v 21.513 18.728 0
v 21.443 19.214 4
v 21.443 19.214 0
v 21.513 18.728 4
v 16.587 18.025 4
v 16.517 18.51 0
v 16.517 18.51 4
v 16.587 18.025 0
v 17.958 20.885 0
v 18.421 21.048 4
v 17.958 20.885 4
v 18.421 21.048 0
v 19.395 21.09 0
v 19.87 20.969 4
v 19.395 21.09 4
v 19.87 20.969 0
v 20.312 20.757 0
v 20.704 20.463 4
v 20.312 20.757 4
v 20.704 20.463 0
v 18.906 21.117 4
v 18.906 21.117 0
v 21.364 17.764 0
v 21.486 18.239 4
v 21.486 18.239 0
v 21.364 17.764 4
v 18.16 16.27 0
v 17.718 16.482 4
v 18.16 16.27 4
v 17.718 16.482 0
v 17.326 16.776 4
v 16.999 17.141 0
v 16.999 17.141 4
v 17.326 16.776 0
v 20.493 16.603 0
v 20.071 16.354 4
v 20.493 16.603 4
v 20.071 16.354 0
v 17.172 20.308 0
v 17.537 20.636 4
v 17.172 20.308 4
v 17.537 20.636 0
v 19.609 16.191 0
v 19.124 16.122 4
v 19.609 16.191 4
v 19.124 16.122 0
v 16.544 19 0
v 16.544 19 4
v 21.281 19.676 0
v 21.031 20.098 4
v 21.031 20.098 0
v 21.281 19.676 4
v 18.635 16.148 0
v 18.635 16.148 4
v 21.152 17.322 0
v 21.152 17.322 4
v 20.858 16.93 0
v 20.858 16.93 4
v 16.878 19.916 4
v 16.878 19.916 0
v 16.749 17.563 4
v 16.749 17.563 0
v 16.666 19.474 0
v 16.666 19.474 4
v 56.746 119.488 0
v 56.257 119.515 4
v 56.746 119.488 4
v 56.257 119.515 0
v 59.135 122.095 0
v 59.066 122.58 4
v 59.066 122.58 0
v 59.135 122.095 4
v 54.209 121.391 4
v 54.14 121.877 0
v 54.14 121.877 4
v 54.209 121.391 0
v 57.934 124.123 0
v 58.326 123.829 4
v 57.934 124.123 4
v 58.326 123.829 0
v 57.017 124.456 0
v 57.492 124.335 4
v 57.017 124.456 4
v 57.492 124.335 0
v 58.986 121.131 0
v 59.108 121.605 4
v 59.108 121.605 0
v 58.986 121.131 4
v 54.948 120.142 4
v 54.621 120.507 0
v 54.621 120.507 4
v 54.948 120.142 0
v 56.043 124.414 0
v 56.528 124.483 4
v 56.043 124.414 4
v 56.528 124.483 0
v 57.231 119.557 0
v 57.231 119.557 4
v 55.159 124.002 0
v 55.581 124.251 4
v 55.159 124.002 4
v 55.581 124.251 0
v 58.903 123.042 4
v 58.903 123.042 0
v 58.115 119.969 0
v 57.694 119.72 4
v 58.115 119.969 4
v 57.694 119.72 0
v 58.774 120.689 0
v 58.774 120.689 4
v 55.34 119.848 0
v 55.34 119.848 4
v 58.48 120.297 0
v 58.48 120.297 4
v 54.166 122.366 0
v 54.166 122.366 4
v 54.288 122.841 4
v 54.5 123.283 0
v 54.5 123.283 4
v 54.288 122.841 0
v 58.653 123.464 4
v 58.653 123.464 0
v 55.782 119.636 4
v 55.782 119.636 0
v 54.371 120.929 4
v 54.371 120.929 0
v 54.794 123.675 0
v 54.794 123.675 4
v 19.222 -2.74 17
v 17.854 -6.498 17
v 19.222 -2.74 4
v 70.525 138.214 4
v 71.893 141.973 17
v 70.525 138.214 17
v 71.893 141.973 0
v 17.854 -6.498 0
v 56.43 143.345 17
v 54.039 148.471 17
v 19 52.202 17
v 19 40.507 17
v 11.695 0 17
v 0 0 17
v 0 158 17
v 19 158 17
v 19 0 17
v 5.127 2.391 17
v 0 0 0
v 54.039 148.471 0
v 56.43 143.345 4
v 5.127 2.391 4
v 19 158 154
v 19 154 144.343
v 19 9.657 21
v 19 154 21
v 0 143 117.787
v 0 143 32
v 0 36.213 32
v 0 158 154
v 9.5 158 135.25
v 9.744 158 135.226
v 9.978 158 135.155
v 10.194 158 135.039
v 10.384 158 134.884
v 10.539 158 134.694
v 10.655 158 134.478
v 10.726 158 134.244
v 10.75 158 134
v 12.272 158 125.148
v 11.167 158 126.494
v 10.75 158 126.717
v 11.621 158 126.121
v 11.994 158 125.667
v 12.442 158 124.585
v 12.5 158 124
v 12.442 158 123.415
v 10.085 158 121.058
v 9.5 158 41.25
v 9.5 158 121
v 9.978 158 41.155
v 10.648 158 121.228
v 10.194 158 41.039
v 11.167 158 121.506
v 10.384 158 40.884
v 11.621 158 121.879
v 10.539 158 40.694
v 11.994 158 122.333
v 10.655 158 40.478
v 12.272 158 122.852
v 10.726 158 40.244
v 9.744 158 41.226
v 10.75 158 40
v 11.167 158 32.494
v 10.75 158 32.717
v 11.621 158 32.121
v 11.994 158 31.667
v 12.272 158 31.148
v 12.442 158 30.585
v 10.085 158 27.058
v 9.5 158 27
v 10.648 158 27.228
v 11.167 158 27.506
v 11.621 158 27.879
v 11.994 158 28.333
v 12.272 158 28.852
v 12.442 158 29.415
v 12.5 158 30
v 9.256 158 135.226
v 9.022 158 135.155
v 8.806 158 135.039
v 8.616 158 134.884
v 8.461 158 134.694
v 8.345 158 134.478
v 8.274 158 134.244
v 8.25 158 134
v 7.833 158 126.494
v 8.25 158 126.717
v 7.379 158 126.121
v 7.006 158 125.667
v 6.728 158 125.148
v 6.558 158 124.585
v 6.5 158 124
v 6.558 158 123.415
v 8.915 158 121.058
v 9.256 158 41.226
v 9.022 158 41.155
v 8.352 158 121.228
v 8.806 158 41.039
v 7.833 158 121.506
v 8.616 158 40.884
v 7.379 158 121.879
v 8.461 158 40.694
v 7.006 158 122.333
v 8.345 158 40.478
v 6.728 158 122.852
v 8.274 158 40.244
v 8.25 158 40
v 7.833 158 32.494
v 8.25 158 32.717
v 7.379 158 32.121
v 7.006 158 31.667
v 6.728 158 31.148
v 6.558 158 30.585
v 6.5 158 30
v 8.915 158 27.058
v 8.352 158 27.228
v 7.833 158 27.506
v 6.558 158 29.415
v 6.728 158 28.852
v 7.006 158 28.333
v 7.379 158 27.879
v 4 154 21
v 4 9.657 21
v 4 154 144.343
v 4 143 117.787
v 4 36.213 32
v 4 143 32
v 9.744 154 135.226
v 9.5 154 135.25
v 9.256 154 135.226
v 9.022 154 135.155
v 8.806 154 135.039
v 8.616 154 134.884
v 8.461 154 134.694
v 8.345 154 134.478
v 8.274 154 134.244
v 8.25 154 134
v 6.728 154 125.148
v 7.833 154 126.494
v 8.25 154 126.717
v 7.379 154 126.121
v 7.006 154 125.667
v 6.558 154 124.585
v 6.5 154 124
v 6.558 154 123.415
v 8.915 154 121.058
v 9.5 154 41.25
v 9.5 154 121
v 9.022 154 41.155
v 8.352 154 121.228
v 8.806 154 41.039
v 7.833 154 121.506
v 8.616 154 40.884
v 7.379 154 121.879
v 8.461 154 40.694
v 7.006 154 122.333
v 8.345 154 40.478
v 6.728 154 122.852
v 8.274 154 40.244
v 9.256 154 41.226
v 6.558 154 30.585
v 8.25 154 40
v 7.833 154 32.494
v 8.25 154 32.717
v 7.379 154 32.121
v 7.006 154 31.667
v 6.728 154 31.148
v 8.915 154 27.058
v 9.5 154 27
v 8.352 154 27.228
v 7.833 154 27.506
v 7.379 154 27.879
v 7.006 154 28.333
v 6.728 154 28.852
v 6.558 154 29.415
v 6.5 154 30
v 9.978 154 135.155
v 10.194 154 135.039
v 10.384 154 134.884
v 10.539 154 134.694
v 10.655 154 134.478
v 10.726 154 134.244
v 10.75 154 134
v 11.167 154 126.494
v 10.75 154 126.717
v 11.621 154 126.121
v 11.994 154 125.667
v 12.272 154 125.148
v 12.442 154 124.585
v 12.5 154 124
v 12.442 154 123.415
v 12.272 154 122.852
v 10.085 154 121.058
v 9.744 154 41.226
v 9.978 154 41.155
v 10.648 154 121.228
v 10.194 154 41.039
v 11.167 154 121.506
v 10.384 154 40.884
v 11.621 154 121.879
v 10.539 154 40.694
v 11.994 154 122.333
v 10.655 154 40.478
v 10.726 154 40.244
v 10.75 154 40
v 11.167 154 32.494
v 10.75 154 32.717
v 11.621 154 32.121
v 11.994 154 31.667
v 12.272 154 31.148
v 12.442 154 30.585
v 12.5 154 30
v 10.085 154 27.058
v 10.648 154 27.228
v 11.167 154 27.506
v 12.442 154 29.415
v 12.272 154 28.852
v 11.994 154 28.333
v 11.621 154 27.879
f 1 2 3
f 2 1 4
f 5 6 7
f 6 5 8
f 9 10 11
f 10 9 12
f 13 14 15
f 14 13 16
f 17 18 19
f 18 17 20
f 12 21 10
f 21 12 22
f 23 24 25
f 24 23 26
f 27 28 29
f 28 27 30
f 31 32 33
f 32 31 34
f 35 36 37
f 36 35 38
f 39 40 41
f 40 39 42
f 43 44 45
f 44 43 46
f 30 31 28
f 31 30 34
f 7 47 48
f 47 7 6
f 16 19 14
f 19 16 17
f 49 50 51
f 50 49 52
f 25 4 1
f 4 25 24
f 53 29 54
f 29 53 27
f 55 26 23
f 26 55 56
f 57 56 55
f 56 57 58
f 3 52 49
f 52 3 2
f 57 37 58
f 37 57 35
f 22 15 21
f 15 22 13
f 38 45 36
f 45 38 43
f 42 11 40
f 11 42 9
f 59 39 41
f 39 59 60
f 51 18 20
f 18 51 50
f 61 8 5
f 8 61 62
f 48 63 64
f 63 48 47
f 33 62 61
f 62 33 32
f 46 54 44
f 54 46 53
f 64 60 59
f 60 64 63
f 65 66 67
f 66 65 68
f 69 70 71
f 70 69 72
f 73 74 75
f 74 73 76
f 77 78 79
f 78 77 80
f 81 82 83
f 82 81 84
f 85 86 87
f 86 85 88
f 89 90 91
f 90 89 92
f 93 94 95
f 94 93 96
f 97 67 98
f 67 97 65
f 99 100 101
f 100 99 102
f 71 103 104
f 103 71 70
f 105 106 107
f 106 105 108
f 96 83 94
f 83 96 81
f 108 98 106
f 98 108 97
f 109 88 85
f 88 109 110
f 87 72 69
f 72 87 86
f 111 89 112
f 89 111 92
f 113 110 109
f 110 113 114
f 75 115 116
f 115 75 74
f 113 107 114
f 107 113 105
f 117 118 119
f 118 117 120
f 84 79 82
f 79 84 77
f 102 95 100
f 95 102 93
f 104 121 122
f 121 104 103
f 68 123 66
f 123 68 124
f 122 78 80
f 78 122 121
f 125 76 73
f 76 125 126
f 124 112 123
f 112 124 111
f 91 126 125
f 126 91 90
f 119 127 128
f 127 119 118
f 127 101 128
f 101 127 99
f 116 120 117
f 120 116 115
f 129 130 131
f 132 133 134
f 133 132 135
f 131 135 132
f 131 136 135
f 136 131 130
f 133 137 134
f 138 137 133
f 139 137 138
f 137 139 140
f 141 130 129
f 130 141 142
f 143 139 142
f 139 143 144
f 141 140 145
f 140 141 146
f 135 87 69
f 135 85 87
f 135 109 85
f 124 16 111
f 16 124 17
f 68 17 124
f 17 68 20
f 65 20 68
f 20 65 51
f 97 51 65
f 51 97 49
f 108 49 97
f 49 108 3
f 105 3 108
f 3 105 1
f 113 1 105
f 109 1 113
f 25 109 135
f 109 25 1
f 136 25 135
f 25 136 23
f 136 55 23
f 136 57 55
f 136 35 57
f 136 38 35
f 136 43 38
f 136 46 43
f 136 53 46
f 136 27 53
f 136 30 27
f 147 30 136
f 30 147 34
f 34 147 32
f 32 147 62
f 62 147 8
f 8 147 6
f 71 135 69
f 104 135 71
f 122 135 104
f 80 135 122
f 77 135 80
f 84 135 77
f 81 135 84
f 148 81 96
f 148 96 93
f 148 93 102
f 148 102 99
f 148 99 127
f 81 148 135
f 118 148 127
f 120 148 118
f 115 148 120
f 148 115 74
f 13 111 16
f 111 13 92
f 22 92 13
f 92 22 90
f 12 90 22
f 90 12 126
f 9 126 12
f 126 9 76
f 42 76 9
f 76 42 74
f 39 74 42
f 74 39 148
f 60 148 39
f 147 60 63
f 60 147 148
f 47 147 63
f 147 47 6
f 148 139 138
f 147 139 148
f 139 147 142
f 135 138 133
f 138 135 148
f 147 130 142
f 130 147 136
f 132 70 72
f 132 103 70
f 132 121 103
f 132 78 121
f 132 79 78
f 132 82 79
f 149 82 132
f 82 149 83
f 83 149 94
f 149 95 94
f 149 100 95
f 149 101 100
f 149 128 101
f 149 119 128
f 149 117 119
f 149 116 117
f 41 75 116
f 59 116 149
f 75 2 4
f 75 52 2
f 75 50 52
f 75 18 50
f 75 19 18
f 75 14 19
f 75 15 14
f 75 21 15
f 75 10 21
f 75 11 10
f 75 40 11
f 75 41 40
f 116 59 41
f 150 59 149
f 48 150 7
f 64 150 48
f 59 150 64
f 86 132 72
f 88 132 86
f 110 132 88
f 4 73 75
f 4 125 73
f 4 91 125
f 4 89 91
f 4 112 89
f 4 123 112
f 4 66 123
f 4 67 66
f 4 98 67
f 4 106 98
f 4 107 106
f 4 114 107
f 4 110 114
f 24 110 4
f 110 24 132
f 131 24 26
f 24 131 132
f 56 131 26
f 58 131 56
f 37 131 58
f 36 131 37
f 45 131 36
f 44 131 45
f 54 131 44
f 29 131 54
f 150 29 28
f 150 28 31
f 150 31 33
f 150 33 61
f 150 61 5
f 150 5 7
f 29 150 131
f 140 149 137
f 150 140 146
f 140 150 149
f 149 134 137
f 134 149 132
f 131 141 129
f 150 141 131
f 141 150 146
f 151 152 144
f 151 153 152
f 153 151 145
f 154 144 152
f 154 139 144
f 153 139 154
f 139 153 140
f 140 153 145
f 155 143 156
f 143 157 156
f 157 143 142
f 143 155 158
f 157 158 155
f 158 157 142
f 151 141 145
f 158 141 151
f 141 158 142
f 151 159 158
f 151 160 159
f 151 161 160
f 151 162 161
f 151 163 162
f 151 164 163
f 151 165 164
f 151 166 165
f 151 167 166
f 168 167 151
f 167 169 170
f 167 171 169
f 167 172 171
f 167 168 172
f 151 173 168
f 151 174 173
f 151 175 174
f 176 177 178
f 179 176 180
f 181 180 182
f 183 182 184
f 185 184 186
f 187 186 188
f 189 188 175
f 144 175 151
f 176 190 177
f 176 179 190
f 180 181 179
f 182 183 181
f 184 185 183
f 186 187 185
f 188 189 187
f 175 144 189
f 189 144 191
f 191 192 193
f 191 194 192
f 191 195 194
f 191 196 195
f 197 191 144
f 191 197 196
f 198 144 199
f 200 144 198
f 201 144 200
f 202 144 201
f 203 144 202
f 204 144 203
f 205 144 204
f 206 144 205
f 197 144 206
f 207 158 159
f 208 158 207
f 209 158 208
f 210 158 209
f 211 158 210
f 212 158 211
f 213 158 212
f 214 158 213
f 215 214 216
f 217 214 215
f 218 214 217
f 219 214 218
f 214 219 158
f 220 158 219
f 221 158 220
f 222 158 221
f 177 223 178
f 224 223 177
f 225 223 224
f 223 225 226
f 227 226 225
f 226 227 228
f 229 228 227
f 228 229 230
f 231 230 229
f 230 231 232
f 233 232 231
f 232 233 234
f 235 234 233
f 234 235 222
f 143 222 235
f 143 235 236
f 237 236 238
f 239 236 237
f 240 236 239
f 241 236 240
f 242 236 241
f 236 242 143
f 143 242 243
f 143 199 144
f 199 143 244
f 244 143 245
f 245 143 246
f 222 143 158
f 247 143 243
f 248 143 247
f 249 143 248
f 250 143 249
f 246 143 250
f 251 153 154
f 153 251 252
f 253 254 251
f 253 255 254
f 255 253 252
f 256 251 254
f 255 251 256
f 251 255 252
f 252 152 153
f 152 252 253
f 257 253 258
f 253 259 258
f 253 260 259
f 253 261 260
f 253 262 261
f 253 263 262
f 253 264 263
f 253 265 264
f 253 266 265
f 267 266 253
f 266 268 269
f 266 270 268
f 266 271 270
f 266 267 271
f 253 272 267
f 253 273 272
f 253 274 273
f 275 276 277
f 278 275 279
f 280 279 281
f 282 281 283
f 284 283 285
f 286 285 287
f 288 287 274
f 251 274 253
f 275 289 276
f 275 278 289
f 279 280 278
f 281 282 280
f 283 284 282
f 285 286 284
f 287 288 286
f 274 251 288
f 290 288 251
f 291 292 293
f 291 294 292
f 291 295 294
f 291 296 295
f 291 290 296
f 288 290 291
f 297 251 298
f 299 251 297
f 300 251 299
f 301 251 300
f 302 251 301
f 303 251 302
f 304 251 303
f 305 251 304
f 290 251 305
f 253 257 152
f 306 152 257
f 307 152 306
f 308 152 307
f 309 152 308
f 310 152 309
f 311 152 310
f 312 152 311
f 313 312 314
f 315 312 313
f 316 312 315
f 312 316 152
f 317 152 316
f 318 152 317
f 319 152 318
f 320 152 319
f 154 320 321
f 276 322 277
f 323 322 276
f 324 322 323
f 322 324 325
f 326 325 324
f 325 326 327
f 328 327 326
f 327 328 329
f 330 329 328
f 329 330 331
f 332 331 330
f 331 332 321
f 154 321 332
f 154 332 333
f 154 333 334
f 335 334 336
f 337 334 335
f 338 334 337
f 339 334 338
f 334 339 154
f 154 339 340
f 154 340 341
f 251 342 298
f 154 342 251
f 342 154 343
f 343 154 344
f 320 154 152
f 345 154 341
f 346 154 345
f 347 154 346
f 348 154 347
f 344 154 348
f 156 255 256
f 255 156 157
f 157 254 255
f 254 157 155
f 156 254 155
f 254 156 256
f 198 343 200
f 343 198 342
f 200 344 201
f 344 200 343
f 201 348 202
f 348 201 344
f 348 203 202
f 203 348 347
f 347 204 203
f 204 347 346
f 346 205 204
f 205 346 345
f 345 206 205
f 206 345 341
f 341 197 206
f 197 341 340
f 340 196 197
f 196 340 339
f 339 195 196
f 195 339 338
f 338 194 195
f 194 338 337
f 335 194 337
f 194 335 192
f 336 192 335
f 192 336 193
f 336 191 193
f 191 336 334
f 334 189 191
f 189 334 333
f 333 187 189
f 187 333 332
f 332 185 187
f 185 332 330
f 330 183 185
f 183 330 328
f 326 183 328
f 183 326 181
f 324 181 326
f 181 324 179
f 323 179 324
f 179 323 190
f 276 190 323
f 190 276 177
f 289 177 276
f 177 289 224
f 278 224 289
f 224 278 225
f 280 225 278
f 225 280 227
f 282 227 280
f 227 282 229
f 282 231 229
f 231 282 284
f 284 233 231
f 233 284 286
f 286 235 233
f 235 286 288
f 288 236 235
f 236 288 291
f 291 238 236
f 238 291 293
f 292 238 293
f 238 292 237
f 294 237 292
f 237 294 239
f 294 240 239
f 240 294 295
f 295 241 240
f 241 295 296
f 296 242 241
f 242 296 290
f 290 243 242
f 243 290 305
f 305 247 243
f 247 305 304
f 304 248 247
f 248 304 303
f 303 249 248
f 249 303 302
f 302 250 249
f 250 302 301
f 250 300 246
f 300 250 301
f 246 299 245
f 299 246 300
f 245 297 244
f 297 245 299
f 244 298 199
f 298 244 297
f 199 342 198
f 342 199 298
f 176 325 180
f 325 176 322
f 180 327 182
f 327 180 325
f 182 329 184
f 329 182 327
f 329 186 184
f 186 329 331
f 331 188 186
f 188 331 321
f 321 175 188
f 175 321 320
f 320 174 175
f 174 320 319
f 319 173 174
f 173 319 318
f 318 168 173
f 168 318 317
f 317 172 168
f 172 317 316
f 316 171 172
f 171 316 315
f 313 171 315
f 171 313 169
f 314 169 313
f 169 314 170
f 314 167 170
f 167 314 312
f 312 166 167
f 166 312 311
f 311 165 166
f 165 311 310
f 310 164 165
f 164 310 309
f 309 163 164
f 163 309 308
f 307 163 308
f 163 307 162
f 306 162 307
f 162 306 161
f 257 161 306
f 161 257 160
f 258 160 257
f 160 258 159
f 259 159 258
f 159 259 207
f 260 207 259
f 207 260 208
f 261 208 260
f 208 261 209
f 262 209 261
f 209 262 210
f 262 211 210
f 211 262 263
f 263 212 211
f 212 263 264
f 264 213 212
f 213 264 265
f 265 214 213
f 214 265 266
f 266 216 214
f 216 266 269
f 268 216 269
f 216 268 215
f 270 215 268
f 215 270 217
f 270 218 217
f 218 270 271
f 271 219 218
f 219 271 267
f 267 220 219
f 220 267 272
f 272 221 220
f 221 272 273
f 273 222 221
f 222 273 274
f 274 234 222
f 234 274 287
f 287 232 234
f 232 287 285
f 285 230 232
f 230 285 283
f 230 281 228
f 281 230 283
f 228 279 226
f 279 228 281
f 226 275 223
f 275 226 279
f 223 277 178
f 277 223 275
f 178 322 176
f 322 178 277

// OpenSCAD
// ============================================================
// Wandhalter für ein Brett (Regalwinkel)
// ============================================================
// Dieses Modell besteht aus zwei Teilen:
//   1. Einem U-förmigen Klemm-Halter, der das Brett von unten
//      und an der Seite umschließt.
//   2. Einem dreieckigen Stützwinkel (45°), der oberhalb des
//      Halters sitzt und die Last auf die Wand ableitet.
// ============================================================

// --- Parameter ---

// Wandstärke aller Außenwände des Halters
_thickness = 4;

// Dicke des Bretts, das gehalten werden soll
_shelves_thickness = 13;

// Breite des Randes, der das Brett seitlich umgreift (Einfassung)
_shelves_edging = 15;

// Tiefe des Bretts (wie weit es von der Wand absteht)
_shelves_depth = 150;

// Winkel des Stützwinkels an der oberen Ecke (zwischen hinterer Wand und Schrägstütze)
// 90° = rechtwinklig, >90° = stumpfwinklig (stütze neigt sich nach vorne)
_bracket_angle = 110;  // in Grad

// Verstärkung hinter den Schlüssellöchern
_reinforcement_depth = 2;  // Tiefe der Verstärkung in Y-Richtung
_reinforcement_top_margin = 8; // Abstand von den Schlüssellöchern zur Ober-/Unterseite der Verstärkung

// Versatz des Wandausschnitts am Stützwinkel (wie viel kleiner das Ausschnitt-Dreieck
// gegenüber dem Außendreieck ist – gleichmäßig an allen drei Seiten)
_bracket_wall_cutout_offset = 15;

// --- Schlüsselloch-Parameter ---
// Durchmesser des kleinen Lochs oben (Schraubenschaft)
_keyhole_shaft_d  = 2.5;
// Durchmesser des großen Lochs unten (Schraubenkopf)
_keyhole_head_d   = 6;
// Abstand zwischen den Mittelpunkten beider Kreise (Lochlänge)
_keyhole_length   = 10;

// --- Verstärkung hinter den Schlüssellöchern ---
// Keine Zwischenvariablen mehr, alles direkt berechnet

// --- Schlüsselloch-Modul ---
// Erzeugt ein Schlüsselloch-Profil, das in Y-Richtung (durch die Rückwand) extrudiert wird.
// Aufruf-Ursprung: X/Z = Mitte des Kopf-Kreises (Schraubenkopf), bei Y = Innenseite der Rückwand.
// Der Kopf (groß) sitzt unten (bei Z=0 des Aufrufs), der Schaft (klein) liegt bei Z = +length.
// Die Extrusion geht von Y-1 bis Y+depth+1, also komplett durch die Rückwand.
// Erzeugt ein Schlüsselloch das in +Y-Richtung durch eine Wand der Dicke "depth" schneidet.
// Aufruf-Ursprung: Mitte des Kopf-Kreises (Schraubenkopf, groß/unten) an der Innenseite der Wand.
// Der Schaft (klein) liegt bei Z = +length oberhalb des Kopfes.
// Kopf (groß, unten) = Schraubenkopf passt durch; Schaft (klein, oben) = Schraubenschaft hält.
module keyhole(shaft_d, head_d, length, depth) {
    // Profil liegt in der XZ-Ebene, Extrusion in Y-Richtung
    rotate([90, 0, 0])             // XZ-Ebene → Extrusion entlang Y
    translate([0, 0, -depth - 1])  // von Außenseite der Wand startend nach innen
    linear_extrude(height = depth + 2)
    union() {
        // Verbindungskanal: Schlitz zwischen Kopf und Schaft
        hull() {
            circle(d = shaft_d, $fn = 32);                        // Schaft-Kreis unten (Kopfmitte)
            translate([0, length]) circle(d = shaft_d, $fn = 32); // Schaft-Kreis oben
        }
        // Großer Kopf-Kreis am unteren Ende
        circle(d = head_d, $fn = 32);
    }
}

// --- Teil 1: U-förmiger Brett-Klemm-Halter ---
// Bei Winkeln >90° neigt sich der Halter nach unten
// Berechnung des Neigungswinkels (Abweichung von 90°)
_tilt_angle = _bracket_angle - 90;  // positive Werte = Halter neigt sich nach unten
_tilt_rad = _tilt_angle * PI / 180;

// Außenquader, aus dem der Innenraum herausgeschnitten wird.
// Bei Neigung wird die Bounding Box größer
difference() {
    // Bei Neigung: gedrehter Außenkörper
    if (_tilt_angle != 0) {
        rotate([0, 0, -_tilt_angle])
        cube([_shelves_edging + _thickness,
              _shelves_depth + _thickness * 2,
              _shelves_thickness + _thickness]);
    } else {
        // Ohne Neigung: normaler Quader
        cube([_shelves_edging + _thickness,
              _shelves_depth + _thickness * 2,
              _shelves_thickness + _thickness]);
    }

    // Innenausschnitt: wird um _thickness in alle Richtungen eingerückt,
    // sodass rundum eine Wandstärke von _thickness übrig bleibt.
    // +1 in X damit der Ausschnitt die Vorderseite vollständig öffnet
    // (kein geschlossenes Vorderpanel – das Brett kann eingeschoben werden).
    if (_tilt_angle != 0) {
        rotate([0, 0, -_tilt_angle])
        translate([_thickness, _thickness, _thickness])
        cube([_shelves_edging + 1,
              _shelves_depth,
              _shelves_thickness]);
    } else {
        translate([_thickness, _thickness, _thickness])
        cube([_shelves_edging + 1,
              _shelves_depth,
              _shelves_thickness]);
    }

    // Bohrungen zur Befestigung des eingeschobenen Bretts
    color("red")
    for (z_pos = [_thickness + 20, _shelves_depth + _thickness - 20]) {
        if (_tilt_angle != 0) {
            rotate([0, 0, -_tilt_angle])
            translate([_shelves_edging / 2 + _thickness, z_pos, -1])
            cylinder(h=_thickness + 2, d=5, $fn=32);
        } else {
            translate([_shelves_edging / 2 + _thickness, z_pos, -1])
            cylinder(h=_thickness + 2, d=5, $fn=32);
        }
    }

}

// --- Teil 2: Dreieckiger Stützwinkel (45°) ---
// Das Dreieck wird als 2D-Polygon erzeugt und dann extrudiert.
// Es sitzt direkt über dem Klemm-Halter und lehnt sich von der
// Oberkante des Halters schräg nach oben zur Wand.
//
// Da Höhe = Breite des Dreiecks, ergibt sich automatisch 45°.
// Gesamtdicke des Stützwinkels in Extrusionsrichtung
_triangle_width = _shelves_edging + _thickness; // = 18 mm

// Innenmaß: Gesamtdicke minus 2× Wandstärke (je eine Wand vorne und hinten)
_triangle_inner = _triangle_width - _thickness * 2;

// Versatz des inneren Dreiecks: um _thickness eingerückt auf allen Seiten.
// Bei einem rechtwinkligen gleichschenkligen Dreieck (45°) beträgt der
// Inradius r = a / (2 + sqrt(2)). Der Einrück-Offset entlang der Katheten
// entspricht direkt _thickness; für die Hypotenuse ergibt sich durch die
// Geometrie derselbe senkrechte Abstand.
_tri_h = (_shelves_depth + _thickness * 2) - (_shelves_thickness + _thickness * 2);
_tri_base = _shelves_depth + _thickness * 2;

// Offset entlang der Katheten (senkrecht zur jeweiligen Achse) = _thickness.
// Für die Hypotenuse (45°) muss der Offset entlang beider Achsen
// _thickness * sqrt(2) betragen, damit der senkrechte Abstand zur
// Hypotenuse ebenfalls _thickness ergibt.
_tri_offset_k = _thickness;                  // Offset entlang Katheten
_tri_offset_h = _thickness * sqrt(2);        // Offset entlang der Hypotenuse-Richtung

_bwco   = _bracket_wall_cutout_offset;           // Kurzname für Katheten-Offset
_bwco_h = _bracket_wall_cutout_offset * sqrt(2); // Offset entlang der Hypotenuse


union() {



    difference() {
        
        translate([_shelves_edging + _thickness,
                _shelves_depth + _thickness * 2,
                _shelves_thickness + _thickness])  // Dreieck an die Oberkante des Halters setzen
        rotate([90, 0, 270])   // Dreieck von der XY-Ebene in die richtige Ausrichtung drehen
        
        difference() {
            // Außenkörper: volles Dreieck, extrudiert auf Gesamtdicke
            linear_extrude(height = _triangle_width)
            polygon([
                [0, 0],
                [0, _tri_h],
                [_tri_base, 0]
            ]);

            // Innenausschnitt: korrekt eingerücktes Dreieck.
            // - Katheten-Ecken: um _tri_offset_k eingerückt (senkrecht zur Achse)
            // - Hypotenuse-Ecke: um _tri_offset_h eingerückt (damit senkrechter
            //   Abstand zur Hypotenuse = _thickness)
            // Startet bei Z = -1 (linke Seite offen), endet bei _triangle_width - _thickness,
            // sodass die rechte Wand (Außenseite, vom Halter abgewandt) mit _thickness stehen bleibt.
            translate([0, 0, -1])
            linear_extrude(height = _triangle_width - _tri_offset_k + 1)
            polygon([
                [_tri_offset_k, _tri_offset_k],                              // Katheten-Ecke
                [_tri_offset_k, _tri_h - _tri_offset_h - _tri_offset_k],    // Y-Kathete eingerückt
                [_tri_base - _tri_offset_h - _tri_offset_k, _tri_offset_k]  // X-Kathete eingerückt
            ]);

            // Wandausschnitt: Dreieck um _bracket_wall_cutout_offset verkleinert.
            // Katheten-Offset = _bracket_wall_cutout_offset, Hypotenuse-Offset = * sqrt(2).
            translate([0, 0, -1])
            linear_extrude(height = _triangle_width + 2)
            polygon([
                [_bwco,              _bwco],
                [_bwco,              _tri_h - _bwco_h - _bwco],
                [_tri_base - _bwco_h - _bwco, _bwco]
            ]);

        
        }

    // Schlüssellöcher durch Rückwand und Verstärkung
        color("red")
        for (z_pos = [(_shelves_thickness + _thickness) + _keyhole_head_d / 2 + 10, _shelves_depth - _keyhole_length - _keyhole_head_d - 10]) {
            translate([(_shelves_edging + _thickness) / 2,
                    _shelves_depth + _thickness,  // Außenseite der Rückwand
                    z_pos])
            keyhole(_keyhole_shaft_d, _keyhole_head_d, _keyhole_length, 
                    _thickness + _reinforcement_depth);
        }
    }
}
